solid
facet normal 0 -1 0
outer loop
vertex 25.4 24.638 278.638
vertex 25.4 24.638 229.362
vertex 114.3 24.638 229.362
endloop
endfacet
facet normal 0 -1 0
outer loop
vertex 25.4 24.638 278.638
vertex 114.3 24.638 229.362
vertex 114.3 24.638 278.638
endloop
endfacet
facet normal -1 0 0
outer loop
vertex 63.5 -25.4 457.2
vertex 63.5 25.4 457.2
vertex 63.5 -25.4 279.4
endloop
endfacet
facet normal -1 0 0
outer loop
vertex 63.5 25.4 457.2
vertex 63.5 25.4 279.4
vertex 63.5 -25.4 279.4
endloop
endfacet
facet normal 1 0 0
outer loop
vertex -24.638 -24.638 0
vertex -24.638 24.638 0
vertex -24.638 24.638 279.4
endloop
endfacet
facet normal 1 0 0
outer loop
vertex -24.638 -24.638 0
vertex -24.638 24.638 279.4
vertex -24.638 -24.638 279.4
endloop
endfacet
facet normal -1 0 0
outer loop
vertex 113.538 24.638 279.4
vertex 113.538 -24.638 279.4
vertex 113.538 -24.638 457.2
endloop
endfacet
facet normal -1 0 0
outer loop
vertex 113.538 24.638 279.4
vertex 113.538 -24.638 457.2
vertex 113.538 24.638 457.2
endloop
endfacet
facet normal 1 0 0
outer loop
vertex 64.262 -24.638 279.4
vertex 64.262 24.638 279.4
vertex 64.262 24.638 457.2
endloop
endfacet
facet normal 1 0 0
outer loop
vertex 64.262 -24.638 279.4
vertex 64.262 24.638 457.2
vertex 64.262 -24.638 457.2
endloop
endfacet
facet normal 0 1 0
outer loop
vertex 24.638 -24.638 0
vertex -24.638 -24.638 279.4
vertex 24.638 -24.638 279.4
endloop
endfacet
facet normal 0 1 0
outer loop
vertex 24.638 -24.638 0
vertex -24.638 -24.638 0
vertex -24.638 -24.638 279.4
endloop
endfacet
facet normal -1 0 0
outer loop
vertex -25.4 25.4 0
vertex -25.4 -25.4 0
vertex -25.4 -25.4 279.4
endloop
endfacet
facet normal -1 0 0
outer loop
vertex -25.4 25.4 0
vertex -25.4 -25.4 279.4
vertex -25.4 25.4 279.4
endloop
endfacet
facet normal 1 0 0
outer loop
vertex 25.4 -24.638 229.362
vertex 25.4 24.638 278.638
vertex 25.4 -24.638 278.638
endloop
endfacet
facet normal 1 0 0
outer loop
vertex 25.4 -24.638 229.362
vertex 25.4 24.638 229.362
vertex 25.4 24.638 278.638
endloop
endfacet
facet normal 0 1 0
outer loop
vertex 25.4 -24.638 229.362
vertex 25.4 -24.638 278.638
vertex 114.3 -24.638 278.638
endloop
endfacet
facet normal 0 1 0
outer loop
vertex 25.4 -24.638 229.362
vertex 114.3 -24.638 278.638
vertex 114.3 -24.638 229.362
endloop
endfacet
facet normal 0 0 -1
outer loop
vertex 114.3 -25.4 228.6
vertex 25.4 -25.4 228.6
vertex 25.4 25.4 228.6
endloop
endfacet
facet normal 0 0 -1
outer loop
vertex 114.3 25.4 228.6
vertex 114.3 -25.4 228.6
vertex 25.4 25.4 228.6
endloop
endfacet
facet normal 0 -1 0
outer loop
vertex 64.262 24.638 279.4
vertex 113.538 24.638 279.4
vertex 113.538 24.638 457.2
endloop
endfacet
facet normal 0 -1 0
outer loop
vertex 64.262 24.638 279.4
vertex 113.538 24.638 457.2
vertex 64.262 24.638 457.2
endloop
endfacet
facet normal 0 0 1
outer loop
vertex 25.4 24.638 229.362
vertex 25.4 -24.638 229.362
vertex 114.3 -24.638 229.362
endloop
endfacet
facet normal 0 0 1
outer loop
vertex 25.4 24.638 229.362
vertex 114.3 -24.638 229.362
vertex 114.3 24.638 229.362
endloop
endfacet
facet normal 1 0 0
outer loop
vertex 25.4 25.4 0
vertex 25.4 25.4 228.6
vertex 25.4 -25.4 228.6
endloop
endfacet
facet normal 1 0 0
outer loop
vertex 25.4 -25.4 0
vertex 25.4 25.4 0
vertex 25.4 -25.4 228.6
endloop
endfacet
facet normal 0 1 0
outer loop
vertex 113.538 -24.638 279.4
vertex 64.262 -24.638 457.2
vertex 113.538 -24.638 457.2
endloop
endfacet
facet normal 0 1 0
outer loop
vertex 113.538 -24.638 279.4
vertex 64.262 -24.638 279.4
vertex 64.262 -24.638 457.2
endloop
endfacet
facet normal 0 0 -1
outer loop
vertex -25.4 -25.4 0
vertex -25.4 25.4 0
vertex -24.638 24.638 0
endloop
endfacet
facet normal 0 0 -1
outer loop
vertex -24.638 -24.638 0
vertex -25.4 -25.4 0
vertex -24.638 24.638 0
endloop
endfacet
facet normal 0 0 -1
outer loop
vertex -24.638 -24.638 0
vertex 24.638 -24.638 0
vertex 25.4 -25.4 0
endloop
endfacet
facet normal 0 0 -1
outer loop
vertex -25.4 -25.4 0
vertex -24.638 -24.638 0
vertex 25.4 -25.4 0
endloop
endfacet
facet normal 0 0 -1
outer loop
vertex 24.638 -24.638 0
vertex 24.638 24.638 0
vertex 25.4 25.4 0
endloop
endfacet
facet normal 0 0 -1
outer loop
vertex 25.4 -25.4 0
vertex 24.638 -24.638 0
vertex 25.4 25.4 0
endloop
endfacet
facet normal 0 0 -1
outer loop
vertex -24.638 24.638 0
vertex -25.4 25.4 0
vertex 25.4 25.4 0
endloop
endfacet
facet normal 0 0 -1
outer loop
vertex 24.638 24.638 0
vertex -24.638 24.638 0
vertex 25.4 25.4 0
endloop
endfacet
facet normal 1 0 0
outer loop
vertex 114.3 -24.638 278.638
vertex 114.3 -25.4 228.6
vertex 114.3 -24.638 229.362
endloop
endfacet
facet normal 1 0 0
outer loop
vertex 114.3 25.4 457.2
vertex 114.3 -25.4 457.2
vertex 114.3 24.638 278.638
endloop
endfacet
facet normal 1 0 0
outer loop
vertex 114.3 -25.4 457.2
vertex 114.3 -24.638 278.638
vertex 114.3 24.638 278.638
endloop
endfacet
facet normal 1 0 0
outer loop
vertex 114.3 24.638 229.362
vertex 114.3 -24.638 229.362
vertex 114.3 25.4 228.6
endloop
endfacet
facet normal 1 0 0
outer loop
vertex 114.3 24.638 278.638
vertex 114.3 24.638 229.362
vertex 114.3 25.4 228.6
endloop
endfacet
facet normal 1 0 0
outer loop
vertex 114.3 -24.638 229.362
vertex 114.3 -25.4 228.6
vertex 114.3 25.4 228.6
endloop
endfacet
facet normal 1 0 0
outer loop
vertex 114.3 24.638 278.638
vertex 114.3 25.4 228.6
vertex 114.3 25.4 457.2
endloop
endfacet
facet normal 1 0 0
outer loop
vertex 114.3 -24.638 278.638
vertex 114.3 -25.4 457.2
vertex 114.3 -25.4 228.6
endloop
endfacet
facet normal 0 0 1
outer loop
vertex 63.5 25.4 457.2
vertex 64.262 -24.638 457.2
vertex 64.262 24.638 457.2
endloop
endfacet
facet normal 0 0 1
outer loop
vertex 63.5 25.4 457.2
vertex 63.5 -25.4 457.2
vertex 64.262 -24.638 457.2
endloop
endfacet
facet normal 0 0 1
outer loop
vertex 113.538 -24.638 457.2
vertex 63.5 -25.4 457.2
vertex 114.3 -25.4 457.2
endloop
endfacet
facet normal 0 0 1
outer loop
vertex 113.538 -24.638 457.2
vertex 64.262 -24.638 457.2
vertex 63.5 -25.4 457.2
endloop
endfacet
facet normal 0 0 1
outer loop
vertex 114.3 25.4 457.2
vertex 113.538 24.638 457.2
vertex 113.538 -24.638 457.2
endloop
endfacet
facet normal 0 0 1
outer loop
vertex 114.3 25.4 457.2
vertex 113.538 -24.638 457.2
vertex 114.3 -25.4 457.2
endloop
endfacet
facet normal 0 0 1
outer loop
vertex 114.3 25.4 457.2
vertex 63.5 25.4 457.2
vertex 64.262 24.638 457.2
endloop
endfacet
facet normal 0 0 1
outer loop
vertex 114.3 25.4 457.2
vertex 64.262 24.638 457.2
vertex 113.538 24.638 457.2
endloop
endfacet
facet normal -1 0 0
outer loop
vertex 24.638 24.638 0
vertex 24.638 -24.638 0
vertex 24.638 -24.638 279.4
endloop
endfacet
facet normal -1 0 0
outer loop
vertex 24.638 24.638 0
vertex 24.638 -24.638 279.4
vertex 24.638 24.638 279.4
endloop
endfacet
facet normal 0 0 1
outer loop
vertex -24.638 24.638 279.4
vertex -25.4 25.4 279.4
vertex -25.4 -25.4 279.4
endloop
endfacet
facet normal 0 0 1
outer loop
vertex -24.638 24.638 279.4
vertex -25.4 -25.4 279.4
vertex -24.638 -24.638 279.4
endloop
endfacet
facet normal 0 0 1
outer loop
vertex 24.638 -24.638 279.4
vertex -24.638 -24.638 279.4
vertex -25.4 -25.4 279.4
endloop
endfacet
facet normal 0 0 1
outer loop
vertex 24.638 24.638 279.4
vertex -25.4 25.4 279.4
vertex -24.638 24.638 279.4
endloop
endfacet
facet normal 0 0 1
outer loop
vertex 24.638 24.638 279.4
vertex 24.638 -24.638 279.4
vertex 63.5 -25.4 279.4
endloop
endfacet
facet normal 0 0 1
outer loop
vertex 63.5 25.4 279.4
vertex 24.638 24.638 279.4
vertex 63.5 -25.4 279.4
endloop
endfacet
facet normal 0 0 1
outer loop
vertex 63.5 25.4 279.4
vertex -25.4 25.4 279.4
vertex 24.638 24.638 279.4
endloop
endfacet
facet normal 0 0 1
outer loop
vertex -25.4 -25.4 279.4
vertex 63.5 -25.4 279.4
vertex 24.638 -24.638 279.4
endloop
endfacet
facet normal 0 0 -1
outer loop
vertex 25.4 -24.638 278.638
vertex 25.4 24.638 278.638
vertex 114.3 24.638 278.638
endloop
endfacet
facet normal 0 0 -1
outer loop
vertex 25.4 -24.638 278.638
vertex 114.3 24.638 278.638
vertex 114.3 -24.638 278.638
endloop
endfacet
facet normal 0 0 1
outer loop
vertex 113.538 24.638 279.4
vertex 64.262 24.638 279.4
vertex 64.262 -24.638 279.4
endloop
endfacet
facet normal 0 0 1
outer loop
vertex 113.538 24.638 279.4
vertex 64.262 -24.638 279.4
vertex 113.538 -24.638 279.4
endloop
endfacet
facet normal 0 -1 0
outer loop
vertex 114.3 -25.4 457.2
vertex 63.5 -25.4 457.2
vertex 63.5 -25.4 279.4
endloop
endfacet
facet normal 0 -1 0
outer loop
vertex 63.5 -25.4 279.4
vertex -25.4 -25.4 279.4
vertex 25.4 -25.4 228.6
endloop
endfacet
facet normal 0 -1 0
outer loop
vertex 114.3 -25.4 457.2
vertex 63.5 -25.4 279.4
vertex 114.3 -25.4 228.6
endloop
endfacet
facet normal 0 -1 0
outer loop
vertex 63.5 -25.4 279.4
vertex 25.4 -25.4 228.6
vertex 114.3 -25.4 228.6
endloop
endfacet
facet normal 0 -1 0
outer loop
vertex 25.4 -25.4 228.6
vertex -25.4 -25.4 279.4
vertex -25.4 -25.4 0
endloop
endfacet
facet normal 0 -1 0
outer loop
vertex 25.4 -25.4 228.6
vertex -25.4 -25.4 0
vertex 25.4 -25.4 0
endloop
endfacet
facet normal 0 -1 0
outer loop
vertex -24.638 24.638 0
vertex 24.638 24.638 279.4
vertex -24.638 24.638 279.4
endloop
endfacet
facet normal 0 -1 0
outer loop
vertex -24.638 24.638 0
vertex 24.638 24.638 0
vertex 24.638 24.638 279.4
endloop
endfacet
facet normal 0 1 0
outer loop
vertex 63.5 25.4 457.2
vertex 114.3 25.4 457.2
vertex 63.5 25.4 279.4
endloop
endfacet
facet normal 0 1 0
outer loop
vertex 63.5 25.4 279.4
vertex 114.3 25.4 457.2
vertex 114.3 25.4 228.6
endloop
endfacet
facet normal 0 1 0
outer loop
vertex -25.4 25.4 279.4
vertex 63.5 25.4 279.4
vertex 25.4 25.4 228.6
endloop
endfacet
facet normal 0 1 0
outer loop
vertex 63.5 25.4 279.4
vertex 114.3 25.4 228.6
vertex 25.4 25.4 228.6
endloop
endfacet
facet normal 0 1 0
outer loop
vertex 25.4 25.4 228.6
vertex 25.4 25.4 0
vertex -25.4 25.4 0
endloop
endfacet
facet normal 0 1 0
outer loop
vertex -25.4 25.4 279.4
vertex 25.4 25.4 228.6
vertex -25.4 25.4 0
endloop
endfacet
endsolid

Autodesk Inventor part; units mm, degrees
ref_plane "YZ Plane" through (0, 0, 0) normal (1, 0, 0) x (0, 1, 0)
ref_plane "XZ Plane" through (0, 0, 0) normal (0, 1, 0) x (-1, 0, 0)
ref_plane "XY Plane" through (0, 0, 0) normal (0, 0, 1) x (1, 0, 0)
sketch "Sketch1" plane through (0, 0, 0) normal (0, 0, 1) x (1, 0, 0)
  line L0 (-25.4, 25.4) -> (25.4, 25.4)
  line L1 (25.4, 25.4) -> (25.4, -25.4)
  line L2 (25.4, -25.4) -> (-25.4, -25.4)
  line L3 (-25.4, -25.4) -> (-25.4, 25.4)
  line L4 (24.638, 24.638) -> (-24.638, 24.638)
  line L5 (-24.638, 24.638) -> (-24.638, -24.638)
  line L6 (-24.638, -24.638) -> (24.638, -24.638)
  line L7 (24.638, -24.638) -> (24.638, 24.638)
  point P0 (0, 0)
  point P1 (0, 25.4)
  point P2 (25.4, 0)
  dimension "d0" = 50.8
  dimension "d1" = 50.8
  dimension "d2" = 0.762
extrude "Extrusion1" add sketch "Sketch1" along normal blind 279.4
sketch "Sketch2" plane through (25.4, -25.4, 0) normal (1, 0, 0) x (0, 0, -1)
  line L0 (0, 50.8) -> (-279.4, 50.8) projected
  line L1 (-279.4, 0) -> (-228.6, 0)
  line L2 (-228.6, 0) -> (-228.6, 50.8)
  line L3 (-228.6, 50.8) -> (-279.4, 50.8)
  line L4 (-279.4, 50.8) -> (-279.4, 0)
  line L5 (-278.638, 0.762) -> (-229.362, 0.762)
  line L6 (-229.362, 0.762) -> (-229.362, 50.038)
  line L7 (-229.362, 50.038) -> (-278.638, 50.038)
  line L8 (-278.638, 50.038) -> (-278.638, 0.762)
  point P0 (0, 25.4)
  dimension "d5" = 50.8
  dimension "d6" = 0.762
extrude "Extrusion2" add sketch "Sketch2" along normal blind 88.9
sketch "Sketch3" plane through (0, 0, 279.4) normal (0, 0, 1) x (1, 0, 0)
  point P0 (0, 0)
sketch "Sketch4" plane through (0, 0, 279.4) normal (0, 0, 1) x (1, 0, 0)
  line L0 (-25.4, -25.4) -> (114.3, -25.4) projected
  line L1 (114.3, 25.4) -> (63.5, 25.4)
  line L2 (63.5, 25.4) -> (63.5, -25.4)
  line L3 (63.5, -25.4) -> (114.3, -25.4)
  line L4 (114.3, -25.4) -> (114.3, 25.4)
  line L5 (113.538, 24.638) -> (64.262, 24.638)
  line L6 (64.262, 24.638) -> (64.262, -24.638)
  line L7 (64.262, -24.638) -> (113.538, -24.638)
  line L8 (113.538, -24.638) -> (113.538, 24.638)
  point P0 (0, 0)
  dimension "d9" = 50.8
  dimension "d10" = 0.762
extrude "Extrusion3" add sketch "Sketch4" along normal blind 177.8
properties part number "Side Rail"
